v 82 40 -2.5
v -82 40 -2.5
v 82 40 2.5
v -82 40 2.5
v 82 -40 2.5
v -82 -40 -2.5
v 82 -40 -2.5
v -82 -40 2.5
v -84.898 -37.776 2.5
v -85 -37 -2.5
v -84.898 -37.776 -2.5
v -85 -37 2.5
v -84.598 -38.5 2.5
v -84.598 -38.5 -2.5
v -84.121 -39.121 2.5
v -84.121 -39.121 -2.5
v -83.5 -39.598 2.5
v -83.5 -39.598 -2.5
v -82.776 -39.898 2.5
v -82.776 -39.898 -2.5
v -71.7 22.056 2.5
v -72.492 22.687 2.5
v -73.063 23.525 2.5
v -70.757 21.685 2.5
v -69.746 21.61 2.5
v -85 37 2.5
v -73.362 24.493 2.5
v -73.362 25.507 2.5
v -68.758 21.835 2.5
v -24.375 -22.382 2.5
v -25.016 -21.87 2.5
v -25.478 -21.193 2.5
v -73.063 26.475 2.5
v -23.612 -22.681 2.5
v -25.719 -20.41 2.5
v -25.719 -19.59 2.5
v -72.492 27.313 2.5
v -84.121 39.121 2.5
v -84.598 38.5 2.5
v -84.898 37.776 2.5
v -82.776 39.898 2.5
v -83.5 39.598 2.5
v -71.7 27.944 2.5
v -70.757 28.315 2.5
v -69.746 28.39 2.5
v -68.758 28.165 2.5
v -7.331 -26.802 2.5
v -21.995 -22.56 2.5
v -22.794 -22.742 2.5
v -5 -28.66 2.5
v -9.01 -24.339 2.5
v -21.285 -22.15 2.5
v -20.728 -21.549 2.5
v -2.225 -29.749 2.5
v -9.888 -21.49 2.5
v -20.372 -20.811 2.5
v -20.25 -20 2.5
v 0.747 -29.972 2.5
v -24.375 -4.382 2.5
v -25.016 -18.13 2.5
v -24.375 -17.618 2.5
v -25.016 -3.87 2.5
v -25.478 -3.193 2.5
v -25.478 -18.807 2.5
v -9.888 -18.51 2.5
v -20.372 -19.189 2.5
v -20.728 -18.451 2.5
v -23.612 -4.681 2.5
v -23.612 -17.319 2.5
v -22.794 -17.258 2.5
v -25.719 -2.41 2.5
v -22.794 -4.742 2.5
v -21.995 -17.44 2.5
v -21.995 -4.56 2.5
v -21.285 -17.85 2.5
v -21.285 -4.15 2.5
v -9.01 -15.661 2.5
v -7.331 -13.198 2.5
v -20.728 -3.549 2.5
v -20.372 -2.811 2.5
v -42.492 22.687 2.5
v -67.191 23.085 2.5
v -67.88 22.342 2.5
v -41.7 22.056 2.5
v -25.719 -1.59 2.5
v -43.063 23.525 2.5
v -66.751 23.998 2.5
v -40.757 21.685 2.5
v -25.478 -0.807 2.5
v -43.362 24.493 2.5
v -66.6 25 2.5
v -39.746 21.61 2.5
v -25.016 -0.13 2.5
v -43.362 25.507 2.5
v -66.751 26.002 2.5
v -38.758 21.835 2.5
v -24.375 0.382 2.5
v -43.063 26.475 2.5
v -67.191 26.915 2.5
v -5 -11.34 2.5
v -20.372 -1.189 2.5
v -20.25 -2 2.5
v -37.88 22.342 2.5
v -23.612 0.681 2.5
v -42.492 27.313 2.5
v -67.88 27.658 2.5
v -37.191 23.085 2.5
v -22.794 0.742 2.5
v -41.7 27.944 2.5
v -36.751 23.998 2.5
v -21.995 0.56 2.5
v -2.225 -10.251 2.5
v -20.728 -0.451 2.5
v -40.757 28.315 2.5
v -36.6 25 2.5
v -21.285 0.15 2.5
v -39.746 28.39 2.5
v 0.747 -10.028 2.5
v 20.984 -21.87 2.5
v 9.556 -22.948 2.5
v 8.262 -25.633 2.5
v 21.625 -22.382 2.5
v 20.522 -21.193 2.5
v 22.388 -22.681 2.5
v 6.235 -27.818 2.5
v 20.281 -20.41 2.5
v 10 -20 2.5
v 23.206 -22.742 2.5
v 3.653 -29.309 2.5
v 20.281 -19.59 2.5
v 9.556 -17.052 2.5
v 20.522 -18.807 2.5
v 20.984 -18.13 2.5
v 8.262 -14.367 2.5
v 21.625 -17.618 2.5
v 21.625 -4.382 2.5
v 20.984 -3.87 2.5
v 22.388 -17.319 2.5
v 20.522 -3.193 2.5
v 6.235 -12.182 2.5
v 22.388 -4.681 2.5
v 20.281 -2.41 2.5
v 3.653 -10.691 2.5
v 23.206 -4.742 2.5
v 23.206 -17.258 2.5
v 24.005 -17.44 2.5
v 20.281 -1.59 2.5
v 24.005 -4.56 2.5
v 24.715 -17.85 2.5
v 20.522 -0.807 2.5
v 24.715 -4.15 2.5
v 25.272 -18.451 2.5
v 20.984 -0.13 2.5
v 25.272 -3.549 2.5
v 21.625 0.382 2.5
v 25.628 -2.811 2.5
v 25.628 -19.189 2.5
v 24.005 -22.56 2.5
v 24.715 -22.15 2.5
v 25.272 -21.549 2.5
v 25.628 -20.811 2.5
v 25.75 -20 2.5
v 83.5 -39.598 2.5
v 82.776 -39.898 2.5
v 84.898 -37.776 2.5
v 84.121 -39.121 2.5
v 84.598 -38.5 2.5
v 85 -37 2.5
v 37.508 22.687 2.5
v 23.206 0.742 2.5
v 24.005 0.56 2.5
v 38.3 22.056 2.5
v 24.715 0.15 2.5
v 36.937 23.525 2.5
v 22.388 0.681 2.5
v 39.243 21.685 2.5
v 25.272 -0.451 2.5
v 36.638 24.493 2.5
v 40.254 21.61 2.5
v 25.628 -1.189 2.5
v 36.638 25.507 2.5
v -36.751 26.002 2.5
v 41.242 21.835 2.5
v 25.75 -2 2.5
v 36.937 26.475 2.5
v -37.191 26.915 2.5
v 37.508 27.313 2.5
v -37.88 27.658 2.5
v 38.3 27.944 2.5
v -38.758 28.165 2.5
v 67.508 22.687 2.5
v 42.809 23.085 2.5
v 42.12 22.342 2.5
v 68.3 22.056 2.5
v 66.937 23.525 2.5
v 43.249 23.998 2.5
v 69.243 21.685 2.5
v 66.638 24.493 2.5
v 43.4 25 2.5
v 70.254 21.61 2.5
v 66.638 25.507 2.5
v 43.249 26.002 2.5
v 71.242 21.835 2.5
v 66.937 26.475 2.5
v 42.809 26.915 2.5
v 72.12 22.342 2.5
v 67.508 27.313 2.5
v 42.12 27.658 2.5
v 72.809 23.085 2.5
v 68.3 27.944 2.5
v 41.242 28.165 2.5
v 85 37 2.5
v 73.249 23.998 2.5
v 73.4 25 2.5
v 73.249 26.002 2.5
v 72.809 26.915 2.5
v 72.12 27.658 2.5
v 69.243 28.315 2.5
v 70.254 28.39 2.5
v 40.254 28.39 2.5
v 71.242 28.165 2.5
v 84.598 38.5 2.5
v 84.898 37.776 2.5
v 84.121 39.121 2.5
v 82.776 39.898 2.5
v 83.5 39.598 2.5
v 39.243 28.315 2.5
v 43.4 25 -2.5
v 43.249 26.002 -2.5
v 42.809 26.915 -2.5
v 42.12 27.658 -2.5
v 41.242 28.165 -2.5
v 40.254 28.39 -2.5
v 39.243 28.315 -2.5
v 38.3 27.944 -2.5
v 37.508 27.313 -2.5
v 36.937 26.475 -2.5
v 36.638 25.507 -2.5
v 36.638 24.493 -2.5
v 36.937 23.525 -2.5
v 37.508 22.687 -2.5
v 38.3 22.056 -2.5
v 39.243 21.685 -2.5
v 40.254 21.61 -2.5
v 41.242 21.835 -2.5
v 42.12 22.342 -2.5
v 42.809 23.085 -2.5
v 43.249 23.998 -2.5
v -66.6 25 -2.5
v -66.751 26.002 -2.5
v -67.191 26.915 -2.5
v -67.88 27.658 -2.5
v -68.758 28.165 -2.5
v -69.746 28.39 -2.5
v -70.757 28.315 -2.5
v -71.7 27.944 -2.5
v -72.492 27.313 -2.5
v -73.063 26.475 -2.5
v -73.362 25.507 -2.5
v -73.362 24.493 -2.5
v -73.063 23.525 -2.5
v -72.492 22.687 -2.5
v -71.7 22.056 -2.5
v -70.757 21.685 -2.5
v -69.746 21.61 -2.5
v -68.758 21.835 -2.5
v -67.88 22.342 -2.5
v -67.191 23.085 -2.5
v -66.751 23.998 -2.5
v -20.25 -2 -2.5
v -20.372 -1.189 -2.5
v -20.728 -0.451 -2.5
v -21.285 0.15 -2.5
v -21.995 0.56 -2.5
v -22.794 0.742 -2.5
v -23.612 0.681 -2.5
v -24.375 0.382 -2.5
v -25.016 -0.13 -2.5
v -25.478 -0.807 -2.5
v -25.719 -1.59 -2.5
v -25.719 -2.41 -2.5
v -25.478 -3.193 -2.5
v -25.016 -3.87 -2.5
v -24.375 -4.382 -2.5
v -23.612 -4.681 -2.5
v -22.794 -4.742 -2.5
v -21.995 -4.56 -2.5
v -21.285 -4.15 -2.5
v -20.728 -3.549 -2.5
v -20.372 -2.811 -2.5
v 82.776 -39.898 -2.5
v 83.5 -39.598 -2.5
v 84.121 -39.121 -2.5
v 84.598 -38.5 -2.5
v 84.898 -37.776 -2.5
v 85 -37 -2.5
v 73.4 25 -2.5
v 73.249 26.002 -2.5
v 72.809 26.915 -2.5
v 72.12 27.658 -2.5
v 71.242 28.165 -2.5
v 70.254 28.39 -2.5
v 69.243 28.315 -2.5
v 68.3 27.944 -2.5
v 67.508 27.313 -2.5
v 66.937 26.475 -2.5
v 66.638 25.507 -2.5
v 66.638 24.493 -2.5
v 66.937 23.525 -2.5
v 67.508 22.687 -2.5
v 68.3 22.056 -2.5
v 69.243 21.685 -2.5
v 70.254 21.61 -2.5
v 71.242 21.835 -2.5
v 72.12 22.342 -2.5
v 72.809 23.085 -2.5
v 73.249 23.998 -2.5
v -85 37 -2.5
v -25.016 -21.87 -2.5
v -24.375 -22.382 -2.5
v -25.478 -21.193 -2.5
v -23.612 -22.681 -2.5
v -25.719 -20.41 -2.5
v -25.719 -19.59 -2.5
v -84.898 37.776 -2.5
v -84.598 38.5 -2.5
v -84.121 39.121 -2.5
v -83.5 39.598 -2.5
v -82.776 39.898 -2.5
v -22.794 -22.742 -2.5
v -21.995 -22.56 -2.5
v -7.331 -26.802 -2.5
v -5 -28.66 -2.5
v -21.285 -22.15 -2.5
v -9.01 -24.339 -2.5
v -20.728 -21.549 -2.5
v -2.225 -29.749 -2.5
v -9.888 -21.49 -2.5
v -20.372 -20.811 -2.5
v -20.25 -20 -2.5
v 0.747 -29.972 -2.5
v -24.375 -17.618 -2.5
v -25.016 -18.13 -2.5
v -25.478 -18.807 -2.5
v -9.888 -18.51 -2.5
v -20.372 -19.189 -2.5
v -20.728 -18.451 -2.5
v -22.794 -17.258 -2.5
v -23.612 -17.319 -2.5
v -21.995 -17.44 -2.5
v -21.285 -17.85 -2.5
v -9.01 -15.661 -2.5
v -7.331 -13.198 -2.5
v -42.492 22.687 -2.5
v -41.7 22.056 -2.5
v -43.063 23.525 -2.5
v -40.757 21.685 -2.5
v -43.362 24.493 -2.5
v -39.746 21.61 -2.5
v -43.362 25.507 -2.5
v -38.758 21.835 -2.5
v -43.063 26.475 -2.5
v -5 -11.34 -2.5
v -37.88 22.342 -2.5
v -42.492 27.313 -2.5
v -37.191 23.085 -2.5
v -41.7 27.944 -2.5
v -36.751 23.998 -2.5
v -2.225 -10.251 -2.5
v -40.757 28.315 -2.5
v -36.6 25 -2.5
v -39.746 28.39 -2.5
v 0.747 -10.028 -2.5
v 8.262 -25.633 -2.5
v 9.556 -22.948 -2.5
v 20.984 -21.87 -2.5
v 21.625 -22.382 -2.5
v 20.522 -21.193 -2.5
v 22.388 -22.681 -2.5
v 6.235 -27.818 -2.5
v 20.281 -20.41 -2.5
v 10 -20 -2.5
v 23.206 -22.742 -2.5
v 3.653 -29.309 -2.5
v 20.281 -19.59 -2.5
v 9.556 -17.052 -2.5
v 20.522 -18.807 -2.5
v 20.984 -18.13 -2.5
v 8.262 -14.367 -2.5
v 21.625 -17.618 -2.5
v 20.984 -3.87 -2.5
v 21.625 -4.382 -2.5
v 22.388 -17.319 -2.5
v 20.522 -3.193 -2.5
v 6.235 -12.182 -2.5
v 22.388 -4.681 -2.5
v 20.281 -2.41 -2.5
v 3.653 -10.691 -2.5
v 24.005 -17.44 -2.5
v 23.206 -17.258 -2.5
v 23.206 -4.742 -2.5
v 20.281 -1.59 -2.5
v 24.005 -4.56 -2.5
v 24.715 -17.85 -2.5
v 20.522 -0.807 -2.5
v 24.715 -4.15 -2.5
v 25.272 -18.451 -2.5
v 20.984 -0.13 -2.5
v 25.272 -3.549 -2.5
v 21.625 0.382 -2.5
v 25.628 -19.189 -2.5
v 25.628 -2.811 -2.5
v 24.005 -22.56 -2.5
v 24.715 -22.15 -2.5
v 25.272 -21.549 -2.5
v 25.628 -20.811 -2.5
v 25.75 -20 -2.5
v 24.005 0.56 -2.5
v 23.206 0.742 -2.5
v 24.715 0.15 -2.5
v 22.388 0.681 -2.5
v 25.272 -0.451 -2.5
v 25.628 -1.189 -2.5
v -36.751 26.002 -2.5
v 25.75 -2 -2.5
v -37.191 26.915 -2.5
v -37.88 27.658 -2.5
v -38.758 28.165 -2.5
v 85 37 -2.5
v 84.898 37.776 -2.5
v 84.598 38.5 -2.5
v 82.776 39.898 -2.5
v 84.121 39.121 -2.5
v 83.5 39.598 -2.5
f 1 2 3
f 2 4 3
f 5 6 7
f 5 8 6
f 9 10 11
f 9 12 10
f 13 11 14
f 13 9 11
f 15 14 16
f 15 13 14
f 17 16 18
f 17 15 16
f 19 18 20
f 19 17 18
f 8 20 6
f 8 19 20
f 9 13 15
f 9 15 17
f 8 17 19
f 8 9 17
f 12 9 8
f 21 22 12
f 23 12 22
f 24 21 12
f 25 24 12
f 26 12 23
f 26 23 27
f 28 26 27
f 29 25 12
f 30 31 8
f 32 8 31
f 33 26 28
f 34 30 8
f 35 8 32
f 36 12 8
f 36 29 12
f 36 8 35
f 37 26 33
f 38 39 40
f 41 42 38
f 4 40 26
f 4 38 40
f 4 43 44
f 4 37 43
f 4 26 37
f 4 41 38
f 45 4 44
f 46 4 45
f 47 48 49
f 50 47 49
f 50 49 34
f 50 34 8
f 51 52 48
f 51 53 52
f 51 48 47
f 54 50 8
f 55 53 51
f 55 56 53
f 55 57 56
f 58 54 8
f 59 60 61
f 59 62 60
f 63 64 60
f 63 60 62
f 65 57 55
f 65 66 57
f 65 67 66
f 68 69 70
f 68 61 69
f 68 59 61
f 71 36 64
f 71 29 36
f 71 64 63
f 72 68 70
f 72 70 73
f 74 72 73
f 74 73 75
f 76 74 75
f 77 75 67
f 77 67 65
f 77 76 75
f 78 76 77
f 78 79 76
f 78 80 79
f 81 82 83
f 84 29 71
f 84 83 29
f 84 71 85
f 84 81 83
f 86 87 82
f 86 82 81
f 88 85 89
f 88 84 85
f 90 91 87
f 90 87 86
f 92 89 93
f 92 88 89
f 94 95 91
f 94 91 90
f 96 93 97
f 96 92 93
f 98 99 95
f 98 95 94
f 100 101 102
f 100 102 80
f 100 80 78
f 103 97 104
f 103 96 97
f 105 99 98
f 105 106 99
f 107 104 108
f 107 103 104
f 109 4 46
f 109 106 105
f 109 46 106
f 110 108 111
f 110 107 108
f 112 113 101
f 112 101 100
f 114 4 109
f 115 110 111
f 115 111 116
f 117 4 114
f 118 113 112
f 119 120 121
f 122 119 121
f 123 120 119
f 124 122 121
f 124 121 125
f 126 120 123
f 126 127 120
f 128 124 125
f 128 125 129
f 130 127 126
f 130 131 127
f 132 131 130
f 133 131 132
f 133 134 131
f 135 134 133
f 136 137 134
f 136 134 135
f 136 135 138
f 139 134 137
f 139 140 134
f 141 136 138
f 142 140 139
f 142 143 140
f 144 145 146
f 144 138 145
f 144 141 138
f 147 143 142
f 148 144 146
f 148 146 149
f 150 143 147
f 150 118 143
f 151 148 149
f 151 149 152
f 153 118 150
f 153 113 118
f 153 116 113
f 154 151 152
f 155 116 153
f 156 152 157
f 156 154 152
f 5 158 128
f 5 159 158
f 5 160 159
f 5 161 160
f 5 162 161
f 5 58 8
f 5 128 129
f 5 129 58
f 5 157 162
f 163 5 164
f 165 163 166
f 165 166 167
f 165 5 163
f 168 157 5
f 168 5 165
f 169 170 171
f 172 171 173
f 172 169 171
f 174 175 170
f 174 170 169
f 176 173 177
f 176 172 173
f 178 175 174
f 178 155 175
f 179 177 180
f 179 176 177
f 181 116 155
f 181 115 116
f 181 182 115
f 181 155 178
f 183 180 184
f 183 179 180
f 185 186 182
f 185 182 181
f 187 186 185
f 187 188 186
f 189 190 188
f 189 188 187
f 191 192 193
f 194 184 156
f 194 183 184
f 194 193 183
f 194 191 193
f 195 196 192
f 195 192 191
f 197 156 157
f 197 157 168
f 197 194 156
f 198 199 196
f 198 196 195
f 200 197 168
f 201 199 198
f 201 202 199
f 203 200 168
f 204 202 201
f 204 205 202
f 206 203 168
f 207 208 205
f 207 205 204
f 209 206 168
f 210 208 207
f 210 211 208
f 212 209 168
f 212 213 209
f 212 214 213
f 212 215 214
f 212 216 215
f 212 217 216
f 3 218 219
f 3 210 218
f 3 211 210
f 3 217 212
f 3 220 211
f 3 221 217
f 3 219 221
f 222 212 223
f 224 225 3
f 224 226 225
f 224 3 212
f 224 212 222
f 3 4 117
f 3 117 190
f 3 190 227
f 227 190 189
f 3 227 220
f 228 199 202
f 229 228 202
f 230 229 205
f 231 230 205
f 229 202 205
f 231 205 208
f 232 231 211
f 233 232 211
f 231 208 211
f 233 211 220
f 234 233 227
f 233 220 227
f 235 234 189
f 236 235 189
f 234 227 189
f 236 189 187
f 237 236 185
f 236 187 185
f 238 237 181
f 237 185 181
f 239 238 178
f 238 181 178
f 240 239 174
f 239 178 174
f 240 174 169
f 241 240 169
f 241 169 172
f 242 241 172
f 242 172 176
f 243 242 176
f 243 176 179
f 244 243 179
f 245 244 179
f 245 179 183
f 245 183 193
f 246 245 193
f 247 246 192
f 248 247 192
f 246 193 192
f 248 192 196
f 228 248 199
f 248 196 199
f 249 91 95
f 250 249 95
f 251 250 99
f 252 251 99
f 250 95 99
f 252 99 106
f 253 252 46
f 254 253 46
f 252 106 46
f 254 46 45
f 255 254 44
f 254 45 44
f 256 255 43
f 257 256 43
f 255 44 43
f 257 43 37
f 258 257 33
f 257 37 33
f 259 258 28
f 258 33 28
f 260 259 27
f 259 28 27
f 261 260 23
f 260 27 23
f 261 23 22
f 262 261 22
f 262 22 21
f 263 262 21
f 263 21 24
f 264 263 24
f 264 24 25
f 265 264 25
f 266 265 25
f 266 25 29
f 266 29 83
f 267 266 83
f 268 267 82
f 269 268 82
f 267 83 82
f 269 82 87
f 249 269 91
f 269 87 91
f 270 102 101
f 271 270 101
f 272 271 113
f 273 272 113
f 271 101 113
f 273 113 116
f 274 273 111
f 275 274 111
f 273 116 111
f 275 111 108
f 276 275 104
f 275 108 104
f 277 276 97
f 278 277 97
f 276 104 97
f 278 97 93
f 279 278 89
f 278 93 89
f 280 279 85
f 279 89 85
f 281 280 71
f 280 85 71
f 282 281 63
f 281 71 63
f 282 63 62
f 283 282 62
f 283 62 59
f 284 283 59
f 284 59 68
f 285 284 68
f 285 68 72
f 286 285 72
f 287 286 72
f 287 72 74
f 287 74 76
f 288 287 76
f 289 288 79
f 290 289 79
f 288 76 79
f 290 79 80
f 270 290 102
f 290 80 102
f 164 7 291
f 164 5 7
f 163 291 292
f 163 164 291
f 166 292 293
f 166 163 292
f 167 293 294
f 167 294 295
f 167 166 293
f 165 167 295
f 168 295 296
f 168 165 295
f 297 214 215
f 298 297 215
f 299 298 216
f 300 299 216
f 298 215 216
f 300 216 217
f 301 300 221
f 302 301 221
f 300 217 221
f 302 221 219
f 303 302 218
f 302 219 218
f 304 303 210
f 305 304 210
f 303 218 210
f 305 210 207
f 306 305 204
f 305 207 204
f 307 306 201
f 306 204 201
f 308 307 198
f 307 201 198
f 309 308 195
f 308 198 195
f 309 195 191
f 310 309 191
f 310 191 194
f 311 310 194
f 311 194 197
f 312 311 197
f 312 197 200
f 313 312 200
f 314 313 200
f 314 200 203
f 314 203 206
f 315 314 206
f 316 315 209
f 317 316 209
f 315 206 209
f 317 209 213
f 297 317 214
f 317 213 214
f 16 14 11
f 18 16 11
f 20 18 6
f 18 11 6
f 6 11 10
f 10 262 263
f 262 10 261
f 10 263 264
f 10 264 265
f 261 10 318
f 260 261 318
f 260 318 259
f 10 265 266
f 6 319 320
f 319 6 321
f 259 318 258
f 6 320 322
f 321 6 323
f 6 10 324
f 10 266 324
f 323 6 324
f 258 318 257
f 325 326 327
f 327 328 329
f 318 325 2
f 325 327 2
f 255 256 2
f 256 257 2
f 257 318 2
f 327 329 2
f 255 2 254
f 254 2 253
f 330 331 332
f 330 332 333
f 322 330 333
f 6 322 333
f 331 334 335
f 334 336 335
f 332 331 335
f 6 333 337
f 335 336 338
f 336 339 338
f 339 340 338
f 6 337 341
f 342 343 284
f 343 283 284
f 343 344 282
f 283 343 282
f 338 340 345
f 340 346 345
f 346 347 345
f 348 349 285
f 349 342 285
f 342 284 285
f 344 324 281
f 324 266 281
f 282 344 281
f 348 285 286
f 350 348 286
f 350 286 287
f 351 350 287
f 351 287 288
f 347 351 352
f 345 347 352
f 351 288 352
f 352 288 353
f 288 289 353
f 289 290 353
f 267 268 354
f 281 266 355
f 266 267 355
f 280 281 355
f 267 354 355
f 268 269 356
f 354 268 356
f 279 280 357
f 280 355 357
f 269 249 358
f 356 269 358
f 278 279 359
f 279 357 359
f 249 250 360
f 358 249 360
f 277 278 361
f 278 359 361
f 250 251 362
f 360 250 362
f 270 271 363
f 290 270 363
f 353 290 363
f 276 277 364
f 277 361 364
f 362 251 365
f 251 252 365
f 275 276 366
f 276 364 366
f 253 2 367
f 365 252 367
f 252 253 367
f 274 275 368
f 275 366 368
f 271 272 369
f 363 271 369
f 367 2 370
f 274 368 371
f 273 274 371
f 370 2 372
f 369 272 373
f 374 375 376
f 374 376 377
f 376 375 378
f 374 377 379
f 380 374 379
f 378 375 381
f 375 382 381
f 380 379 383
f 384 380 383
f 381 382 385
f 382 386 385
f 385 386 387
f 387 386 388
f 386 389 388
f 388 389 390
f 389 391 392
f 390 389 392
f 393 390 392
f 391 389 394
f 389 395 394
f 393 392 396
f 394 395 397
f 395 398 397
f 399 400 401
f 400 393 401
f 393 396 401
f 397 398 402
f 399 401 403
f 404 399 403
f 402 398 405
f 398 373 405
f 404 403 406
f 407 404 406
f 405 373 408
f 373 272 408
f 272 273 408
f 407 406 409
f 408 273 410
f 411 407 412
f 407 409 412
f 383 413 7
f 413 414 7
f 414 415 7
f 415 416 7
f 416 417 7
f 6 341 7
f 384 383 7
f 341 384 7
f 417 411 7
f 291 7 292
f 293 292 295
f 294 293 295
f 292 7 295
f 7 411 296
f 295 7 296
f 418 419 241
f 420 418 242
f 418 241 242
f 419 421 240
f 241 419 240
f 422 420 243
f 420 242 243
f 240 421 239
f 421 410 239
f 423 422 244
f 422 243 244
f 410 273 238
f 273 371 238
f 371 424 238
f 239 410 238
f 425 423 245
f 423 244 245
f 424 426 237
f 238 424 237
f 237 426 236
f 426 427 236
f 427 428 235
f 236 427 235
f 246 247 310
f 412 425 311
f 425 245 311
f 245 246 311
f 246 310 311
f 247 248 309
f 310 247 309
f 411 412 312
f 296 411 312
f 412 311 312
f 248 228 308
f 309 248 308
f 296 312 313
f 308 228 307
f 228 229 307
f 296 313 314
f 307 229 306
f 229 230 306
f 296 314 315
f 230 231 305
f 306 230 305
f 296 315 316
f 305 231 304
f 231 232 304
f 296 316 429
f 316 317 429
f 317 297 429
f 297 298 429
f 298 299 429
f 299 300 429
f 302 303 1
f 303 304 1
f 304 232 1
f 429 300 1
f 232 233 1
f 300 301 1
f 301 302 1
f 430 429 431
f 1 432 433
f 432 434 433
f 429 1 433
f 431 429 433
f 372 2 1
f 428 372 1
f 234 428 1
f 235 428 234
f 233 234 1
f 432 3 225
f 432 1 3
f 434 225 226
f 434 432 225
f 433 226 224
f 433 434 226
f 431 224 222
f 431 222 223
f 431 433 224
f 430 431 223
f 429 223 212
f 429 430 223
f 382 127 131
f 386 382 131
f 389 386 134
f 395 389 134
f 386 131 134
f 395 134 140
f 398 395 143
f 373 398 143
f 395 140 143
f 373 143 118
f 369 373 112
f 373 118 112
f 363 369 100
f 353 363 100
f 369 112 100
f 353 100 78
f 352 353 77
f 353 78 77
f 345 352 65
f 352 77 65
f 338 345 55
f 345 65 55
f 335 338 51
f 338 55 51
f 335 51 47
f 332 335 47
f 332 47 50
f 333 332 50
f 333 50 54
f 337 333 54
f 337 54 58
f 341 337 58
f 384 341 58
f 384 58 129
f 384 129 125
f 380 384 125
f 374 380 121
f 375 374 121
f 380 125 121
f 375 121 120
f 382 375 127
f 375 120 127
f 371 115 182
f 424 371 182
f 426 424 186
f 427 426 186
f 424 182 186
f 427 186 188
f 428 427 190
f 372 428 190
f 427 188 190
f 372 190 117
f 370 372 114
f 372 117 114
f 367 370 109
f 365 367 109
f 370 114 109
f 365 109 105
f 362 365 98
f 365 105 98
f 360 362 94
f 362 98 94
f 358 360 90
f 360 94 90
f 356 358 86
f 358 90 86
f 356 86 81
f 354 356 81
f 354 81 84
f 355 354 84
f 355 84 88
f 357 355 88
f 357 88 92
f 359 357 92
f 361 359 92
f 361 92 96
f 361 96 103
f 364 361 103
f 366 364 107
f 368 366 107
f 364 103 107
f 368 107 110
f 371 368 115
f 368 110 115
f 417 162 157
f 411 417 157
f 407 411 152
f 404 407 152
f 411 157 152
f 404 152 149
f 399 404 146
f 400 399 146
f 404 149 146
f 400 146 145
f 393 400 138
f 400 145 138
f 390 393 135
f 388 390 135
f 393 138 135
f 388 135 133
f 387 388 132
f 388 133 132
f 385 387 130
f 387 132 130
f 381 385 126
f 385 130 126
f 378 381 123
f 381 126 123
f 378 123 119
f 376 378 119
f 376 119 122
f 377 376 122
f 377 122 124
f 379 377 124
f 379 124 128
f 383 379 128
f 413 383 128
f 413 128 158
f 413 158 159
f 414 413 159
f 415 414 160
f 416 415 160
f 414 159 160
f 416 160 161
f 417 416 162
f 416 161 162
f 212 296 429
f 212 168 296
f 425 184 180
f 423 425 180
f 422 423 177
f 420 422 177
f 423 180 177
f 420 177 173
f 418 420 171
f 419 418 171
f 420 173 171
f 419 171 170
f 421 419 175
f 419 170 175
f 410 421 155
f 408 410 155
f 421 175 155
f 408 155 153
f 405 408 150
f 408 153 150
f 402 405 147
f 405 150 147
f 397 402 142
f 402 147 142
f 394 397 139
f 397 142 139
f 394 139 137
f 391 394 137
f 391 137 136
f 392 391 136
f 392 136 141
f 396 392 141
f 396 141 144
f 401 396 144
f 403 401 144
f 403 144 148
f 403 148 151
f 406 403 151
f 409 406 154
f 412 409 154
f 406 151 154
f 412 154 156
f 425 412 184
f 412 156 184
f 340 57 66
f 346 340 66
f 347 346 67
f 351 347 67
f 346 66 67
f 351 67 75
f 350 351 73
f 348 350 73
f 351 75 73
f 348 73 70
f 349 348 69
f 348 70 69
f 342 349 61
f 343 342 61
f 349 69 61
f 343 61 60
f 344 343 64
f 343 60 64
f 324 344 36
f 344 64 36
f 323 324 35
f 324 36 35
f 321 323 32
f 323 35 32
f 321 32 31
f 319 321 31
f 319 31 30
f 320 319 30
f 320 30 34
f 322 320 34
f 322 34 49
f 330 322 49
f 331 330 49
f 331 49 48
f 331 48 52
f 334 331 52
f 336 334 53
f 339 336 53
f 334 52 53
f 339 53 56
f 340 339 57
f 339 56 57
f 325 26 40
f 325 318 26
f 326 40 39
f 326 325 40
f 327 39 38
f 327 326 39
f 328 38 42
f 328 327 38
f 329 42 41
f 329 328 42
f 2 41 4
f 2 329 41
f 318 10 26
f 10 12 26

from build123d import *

# Parameters (mm, degrees)
F0_W     = 170
F0_H     = 80
F1_DEPTH = 2.5
F2_R     = 3.4
F2_R_2   = 10
F2_R_3   = 2.75
F3_DEPTH = 5
F4_R     = 3


with BuildPart() as f1:
    # F0 (on Top) → F1 (new body, symmetric)
    with BuildSketch(Plane.XY):
        Rectangle(F0_W, F0_H)
    extrude(amount=F1_DEPTH, both=True)

    # F2 (on face) → F3 (cut)
    with BuildSketch(Plane.XY.offset(2.5)):
        with Locations((40, 25)):
            Circle(F2_R)
        with Locations((70, 25)):
            Circle(F2_R)
        with Locations((-40, 25)):
            Circle(F2_R)
        with Locations((-70, 25)):
            Circle(F2_R)
        with Locations((0, -20)):
            Circle(F2_R_2)
        with Locations((-23, -2)):
            Circle(F2_R_3)
        with Locations((-23, -20)):
            Circle(F2_R_3)
        with Locations((23, -2)):
            Circle(F2_R_3)
        with Locations((23, -20)):
            Circle(F2_R_3)
    extrude(amount=-F3_DEPTH, mode=Mode.SUBTRACT)

    # F4
    f4_edges = [f1.edges().sort_by_distance(p)[0] for p in [
        (-85, -40, 0),
        (85, -40, 0),
        (-85, 40, 0),
        (85, 40, 0),
    ]]
    fillet(f4_edges, radius=F4_R)


solid = f1.part
